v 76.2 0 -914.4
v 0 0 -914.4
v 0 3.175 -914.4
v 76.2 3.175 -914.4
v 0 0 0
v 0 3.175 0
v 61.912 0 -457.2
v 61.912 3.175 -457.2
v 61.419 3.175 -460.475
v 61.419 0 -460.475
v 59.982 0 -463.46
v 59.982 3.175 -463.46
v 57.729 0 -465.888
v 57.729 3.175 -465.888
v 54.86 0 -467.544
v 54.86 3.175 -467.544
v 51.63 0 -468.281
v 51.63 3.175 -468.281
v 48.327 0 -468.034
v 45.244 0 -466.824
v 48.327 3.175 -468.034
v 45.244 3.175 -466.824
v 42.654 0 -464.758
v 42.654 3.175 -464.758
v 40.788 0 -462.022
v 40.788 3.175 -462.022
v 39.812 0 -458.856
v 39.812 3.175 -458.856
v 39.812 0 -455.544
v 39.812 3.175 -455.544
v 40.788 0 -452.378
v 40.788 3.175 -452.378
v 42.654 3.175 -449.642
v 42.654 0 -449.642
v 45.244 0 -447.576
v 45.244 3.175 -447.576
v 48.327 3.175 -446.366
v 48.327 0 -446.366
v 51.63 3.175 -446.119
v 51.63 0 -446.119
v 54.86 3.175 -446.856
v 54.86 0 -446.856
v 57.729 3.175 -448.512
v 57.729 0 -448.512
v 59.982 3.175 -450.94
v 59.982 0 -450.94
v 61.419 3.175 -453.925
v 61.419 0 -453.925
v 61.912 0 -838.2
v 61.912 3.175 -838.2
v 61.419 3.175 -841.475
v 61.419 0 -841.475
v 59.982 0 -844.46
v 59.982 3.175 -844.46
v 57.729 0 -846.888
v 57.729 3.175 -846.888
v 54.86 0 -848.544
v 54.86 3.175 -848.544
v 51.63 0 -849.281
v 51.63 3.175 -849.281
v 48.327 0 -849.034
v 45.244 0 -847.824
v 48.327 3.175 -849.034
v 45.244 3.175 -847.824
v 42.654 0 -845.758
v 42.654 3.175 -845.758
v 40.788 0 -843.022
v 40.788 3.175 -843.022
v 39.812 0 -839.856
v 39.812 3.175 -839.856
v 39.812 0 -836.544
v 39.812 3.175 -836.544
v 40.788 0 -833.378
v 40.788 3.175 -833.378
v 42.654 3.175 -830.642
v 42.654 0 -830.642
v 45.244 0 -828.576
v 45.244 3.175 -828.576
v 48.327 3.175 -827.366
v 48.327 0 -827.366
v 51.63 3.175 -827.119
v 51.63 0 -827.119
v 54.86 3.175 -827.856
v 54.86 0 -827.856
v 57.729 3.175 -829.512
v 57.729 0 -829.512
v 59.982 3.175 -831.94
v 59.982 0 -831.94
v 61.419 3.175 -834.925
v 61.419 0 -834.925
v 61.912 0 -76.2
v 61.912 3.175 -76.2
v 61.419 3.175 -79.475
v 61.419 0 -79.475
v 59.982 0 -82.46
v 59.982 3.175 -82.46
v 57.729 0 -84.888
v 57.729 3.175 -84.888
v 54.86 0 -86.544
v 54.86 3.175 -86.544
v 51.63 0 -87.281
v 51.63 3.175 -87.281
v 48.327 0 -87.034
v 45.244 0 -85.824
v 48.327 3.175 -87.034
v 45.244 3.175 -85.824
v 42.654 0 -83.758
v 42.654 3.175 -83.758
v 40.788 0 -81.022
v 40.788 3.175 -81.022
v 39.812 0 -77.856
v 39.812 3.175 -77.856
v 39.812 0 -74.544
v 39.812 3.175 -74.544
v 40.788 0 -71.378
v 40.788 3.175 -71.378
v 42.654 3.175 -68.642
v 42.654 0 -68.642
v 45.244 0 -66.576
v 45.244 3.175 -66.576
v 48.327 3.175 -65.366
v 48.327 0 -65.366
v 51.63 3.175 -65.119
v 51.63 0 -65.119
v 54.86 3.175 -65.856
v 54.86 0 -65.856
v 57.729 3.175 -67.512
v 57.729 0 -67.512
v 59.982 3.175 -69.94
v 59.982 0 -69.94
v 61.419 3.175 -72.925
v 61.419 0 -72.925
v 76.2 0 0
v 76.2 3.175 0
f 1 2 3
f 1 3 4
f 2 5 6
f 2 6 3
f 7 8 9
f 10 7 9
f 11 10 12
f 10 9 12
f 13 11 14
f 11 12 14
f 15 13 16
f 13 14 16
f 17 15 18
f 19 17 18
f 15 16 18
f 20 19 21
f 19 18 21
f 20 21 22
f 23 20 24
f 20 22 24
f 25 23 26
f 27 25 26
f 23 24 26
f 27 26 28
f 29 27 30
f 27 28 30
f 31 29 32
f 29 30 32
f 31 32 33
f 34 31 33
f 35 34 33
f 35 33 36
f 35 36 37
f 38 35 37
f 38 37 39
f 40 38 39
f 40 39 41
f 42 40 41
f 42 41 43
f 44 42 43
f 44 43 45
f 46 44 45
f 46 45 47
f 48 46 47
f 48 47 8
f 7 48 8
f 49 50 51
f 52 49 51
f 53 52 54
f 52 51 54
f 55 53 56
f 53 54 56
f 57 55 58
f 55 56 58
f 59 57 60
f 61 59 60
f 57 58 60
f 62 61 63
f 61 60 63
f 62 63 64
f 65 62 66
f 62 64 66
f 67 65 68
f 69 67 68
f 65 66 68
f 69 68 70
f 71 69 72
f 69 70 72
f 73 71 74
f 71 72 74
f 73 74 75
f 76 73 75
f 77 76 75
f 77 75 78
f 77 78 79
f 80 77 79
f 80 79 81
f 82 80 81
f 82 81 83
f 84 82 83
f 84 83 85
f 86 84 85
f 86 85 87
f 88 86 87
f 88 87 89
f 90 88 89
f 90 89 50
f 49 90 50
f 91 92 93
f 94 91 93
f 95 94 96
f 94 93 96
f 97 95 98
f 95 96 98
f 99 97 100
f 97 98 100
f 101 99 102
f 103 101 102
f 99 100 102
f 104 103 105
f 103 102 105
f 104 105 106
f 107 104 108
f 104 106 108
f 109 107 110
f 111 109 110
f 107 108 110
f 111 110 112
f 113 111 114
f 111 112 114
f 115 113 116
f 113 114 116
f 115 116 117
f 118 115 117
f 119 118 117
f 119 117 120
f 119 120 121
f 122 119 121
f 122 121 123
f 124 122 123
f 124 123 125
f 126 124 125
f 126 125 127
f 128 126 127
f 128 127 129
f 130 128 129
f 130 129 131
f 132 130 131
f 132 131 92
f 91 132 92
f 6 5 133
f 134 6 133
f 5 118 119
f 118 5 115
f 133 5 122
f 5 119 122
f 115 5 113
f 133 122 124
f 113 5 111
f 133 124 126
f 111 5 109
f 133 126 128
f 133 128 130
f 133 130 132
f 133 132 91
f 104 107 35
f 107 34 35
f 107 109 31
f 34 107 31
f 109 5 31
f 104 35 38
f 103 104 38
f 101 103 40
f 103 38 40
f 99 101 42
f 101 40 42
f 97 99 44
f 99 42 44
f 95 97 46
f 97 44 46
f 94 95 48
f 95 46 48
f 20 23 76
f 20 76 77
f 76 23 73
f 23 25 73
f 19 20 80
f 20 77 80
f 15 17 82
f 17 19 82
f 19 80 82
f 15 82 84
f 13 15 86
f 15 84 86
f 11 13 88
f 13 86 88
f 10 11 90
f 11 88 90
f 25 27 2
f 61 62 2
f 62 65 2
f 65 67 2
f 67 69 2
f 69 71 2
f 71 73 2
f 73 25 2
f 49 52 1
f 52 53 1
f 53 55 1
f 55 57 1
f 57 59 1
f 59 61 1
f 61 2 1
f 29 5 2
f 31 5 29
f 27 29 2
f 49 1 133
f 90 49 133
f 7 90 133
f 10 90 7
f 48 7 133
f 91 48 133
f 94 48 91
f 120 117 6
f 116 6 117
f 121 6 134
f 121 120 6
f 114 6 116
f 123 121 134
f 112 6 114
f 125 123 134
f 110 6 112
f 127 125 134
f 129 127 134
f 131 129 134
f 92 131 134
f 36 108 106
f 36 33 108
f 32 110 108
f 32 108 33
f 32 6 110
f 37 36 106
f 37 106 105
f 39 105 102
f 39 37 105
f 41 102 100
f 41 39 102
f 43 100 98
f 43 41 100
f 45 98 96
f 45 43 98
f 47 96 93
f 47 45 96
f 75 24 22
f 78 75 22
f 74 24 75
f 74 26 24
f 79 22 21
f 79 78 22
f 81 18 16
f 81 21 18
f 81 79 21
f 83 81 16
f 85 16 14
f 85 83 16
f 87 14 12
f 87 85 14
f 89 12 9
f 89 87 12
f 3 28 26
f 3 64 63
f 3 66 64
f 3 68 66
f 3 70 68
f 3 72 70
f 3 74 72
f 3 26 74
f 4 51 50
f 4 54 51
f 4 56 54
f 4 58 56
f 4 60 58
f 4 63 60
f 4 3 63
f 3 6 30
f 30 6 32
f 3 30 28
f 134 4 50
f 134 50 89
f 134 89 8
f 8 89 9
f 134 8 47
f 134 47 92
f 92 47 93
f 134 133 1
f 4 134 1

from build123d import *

# Parameters (mm, degrees)
SKETCH1_W           = 76.2
SKETCH1_H           = 914.4
BOSS_EXTRUDE1_DEPTH = 3.175
CUT_EXTRUDE1_REACH  = 5.175
SKETCH2_R           = 11.1125


with BuildPart() as part:
    # Sketch1 → Boss-Extrude1 (new body)
    with BuildSketch(Plane(origin=(0, 0, 0), x_dir=(1, 0, 0), z_dir=(0, 1, 0))):
        with Locations((38.1, 457.2)):
            Rectangle(SKETCH1_W, SKETCH1_H)
    extrude(amount=BOSS_EXTRUDE1_DEPTH)

    # Sketch2 → Cut-Extrude1 (cut, up to next)
    with BuildSketch(Plane(origin=(0, 3.175, 0), x_dir=(1, 0, 0), z_dir=(0, 1, 0)), mode=Mode.PRIVATE) as cut_extrude1_sk1:
        with Locations((50.8, 838.2)):
            Circle(SKETCH2_R)
    cut_extrude1_tool1 = extrude(cut_extrude1_sk1.sketch, amount=-CUT_EXTRUDE1_REACH, mode=Mode.PRIVATE) & part.part
    add(cut_extrude1_tool1.solids().sort_by_distance((50.8, 3.175, -838.2))[0], mode=Mode.SUBTRACT)
    # Sketch2 → Cut-Extrude1 (cut, up to next)
    with BuildSketch(Plane(origin=(0, 3.175, 0), x_dir=(1, 0, 0), z_dir=(0, 1, 0)), mode=Mode.PRIVATE) as cut_extrude1_sk2:
        with Locations((50.8, 457.2)):
            Circle(SKETCH2_R)
    cut_extrude1_tool2 = extrude(cut_extrude1_sk2.sketch, amount=-CUT_EXTRUDE1_REACH, mode=Mode.PRIVATE) & part.part
    add(cut_extrude1_tool2.solids().sort_by_distance((50.8, 3.175, -457.2))[0], mode=Mode.SUBTRACT)
    # Sketch2 → Cut-Extrude1 (cut, up to next)
    with BuildSketch(Plane(origin=(0, 3.175, 0), x_dir=(1, 0, 0), z_dir=(0, 1, 0)), mode=Mode.PRIVATE) as cut_extrude1_sk3:
        with Locations((50.8, 76.2)):
            Circle(SKETCH2_R)
    cut_extrude1_tool3 = extrude(cut_extrude1_sk3.sketch, amount=-CUT_EXTRUDE1_REACH, mode=Mode.PRIVATE) & part.part
    add(cut_extrude1_tool3.solids().sort_by_distance((50.8, 3.175, -76.2))[0], mode=Mode.SUBTRACT)


solid = part.part
